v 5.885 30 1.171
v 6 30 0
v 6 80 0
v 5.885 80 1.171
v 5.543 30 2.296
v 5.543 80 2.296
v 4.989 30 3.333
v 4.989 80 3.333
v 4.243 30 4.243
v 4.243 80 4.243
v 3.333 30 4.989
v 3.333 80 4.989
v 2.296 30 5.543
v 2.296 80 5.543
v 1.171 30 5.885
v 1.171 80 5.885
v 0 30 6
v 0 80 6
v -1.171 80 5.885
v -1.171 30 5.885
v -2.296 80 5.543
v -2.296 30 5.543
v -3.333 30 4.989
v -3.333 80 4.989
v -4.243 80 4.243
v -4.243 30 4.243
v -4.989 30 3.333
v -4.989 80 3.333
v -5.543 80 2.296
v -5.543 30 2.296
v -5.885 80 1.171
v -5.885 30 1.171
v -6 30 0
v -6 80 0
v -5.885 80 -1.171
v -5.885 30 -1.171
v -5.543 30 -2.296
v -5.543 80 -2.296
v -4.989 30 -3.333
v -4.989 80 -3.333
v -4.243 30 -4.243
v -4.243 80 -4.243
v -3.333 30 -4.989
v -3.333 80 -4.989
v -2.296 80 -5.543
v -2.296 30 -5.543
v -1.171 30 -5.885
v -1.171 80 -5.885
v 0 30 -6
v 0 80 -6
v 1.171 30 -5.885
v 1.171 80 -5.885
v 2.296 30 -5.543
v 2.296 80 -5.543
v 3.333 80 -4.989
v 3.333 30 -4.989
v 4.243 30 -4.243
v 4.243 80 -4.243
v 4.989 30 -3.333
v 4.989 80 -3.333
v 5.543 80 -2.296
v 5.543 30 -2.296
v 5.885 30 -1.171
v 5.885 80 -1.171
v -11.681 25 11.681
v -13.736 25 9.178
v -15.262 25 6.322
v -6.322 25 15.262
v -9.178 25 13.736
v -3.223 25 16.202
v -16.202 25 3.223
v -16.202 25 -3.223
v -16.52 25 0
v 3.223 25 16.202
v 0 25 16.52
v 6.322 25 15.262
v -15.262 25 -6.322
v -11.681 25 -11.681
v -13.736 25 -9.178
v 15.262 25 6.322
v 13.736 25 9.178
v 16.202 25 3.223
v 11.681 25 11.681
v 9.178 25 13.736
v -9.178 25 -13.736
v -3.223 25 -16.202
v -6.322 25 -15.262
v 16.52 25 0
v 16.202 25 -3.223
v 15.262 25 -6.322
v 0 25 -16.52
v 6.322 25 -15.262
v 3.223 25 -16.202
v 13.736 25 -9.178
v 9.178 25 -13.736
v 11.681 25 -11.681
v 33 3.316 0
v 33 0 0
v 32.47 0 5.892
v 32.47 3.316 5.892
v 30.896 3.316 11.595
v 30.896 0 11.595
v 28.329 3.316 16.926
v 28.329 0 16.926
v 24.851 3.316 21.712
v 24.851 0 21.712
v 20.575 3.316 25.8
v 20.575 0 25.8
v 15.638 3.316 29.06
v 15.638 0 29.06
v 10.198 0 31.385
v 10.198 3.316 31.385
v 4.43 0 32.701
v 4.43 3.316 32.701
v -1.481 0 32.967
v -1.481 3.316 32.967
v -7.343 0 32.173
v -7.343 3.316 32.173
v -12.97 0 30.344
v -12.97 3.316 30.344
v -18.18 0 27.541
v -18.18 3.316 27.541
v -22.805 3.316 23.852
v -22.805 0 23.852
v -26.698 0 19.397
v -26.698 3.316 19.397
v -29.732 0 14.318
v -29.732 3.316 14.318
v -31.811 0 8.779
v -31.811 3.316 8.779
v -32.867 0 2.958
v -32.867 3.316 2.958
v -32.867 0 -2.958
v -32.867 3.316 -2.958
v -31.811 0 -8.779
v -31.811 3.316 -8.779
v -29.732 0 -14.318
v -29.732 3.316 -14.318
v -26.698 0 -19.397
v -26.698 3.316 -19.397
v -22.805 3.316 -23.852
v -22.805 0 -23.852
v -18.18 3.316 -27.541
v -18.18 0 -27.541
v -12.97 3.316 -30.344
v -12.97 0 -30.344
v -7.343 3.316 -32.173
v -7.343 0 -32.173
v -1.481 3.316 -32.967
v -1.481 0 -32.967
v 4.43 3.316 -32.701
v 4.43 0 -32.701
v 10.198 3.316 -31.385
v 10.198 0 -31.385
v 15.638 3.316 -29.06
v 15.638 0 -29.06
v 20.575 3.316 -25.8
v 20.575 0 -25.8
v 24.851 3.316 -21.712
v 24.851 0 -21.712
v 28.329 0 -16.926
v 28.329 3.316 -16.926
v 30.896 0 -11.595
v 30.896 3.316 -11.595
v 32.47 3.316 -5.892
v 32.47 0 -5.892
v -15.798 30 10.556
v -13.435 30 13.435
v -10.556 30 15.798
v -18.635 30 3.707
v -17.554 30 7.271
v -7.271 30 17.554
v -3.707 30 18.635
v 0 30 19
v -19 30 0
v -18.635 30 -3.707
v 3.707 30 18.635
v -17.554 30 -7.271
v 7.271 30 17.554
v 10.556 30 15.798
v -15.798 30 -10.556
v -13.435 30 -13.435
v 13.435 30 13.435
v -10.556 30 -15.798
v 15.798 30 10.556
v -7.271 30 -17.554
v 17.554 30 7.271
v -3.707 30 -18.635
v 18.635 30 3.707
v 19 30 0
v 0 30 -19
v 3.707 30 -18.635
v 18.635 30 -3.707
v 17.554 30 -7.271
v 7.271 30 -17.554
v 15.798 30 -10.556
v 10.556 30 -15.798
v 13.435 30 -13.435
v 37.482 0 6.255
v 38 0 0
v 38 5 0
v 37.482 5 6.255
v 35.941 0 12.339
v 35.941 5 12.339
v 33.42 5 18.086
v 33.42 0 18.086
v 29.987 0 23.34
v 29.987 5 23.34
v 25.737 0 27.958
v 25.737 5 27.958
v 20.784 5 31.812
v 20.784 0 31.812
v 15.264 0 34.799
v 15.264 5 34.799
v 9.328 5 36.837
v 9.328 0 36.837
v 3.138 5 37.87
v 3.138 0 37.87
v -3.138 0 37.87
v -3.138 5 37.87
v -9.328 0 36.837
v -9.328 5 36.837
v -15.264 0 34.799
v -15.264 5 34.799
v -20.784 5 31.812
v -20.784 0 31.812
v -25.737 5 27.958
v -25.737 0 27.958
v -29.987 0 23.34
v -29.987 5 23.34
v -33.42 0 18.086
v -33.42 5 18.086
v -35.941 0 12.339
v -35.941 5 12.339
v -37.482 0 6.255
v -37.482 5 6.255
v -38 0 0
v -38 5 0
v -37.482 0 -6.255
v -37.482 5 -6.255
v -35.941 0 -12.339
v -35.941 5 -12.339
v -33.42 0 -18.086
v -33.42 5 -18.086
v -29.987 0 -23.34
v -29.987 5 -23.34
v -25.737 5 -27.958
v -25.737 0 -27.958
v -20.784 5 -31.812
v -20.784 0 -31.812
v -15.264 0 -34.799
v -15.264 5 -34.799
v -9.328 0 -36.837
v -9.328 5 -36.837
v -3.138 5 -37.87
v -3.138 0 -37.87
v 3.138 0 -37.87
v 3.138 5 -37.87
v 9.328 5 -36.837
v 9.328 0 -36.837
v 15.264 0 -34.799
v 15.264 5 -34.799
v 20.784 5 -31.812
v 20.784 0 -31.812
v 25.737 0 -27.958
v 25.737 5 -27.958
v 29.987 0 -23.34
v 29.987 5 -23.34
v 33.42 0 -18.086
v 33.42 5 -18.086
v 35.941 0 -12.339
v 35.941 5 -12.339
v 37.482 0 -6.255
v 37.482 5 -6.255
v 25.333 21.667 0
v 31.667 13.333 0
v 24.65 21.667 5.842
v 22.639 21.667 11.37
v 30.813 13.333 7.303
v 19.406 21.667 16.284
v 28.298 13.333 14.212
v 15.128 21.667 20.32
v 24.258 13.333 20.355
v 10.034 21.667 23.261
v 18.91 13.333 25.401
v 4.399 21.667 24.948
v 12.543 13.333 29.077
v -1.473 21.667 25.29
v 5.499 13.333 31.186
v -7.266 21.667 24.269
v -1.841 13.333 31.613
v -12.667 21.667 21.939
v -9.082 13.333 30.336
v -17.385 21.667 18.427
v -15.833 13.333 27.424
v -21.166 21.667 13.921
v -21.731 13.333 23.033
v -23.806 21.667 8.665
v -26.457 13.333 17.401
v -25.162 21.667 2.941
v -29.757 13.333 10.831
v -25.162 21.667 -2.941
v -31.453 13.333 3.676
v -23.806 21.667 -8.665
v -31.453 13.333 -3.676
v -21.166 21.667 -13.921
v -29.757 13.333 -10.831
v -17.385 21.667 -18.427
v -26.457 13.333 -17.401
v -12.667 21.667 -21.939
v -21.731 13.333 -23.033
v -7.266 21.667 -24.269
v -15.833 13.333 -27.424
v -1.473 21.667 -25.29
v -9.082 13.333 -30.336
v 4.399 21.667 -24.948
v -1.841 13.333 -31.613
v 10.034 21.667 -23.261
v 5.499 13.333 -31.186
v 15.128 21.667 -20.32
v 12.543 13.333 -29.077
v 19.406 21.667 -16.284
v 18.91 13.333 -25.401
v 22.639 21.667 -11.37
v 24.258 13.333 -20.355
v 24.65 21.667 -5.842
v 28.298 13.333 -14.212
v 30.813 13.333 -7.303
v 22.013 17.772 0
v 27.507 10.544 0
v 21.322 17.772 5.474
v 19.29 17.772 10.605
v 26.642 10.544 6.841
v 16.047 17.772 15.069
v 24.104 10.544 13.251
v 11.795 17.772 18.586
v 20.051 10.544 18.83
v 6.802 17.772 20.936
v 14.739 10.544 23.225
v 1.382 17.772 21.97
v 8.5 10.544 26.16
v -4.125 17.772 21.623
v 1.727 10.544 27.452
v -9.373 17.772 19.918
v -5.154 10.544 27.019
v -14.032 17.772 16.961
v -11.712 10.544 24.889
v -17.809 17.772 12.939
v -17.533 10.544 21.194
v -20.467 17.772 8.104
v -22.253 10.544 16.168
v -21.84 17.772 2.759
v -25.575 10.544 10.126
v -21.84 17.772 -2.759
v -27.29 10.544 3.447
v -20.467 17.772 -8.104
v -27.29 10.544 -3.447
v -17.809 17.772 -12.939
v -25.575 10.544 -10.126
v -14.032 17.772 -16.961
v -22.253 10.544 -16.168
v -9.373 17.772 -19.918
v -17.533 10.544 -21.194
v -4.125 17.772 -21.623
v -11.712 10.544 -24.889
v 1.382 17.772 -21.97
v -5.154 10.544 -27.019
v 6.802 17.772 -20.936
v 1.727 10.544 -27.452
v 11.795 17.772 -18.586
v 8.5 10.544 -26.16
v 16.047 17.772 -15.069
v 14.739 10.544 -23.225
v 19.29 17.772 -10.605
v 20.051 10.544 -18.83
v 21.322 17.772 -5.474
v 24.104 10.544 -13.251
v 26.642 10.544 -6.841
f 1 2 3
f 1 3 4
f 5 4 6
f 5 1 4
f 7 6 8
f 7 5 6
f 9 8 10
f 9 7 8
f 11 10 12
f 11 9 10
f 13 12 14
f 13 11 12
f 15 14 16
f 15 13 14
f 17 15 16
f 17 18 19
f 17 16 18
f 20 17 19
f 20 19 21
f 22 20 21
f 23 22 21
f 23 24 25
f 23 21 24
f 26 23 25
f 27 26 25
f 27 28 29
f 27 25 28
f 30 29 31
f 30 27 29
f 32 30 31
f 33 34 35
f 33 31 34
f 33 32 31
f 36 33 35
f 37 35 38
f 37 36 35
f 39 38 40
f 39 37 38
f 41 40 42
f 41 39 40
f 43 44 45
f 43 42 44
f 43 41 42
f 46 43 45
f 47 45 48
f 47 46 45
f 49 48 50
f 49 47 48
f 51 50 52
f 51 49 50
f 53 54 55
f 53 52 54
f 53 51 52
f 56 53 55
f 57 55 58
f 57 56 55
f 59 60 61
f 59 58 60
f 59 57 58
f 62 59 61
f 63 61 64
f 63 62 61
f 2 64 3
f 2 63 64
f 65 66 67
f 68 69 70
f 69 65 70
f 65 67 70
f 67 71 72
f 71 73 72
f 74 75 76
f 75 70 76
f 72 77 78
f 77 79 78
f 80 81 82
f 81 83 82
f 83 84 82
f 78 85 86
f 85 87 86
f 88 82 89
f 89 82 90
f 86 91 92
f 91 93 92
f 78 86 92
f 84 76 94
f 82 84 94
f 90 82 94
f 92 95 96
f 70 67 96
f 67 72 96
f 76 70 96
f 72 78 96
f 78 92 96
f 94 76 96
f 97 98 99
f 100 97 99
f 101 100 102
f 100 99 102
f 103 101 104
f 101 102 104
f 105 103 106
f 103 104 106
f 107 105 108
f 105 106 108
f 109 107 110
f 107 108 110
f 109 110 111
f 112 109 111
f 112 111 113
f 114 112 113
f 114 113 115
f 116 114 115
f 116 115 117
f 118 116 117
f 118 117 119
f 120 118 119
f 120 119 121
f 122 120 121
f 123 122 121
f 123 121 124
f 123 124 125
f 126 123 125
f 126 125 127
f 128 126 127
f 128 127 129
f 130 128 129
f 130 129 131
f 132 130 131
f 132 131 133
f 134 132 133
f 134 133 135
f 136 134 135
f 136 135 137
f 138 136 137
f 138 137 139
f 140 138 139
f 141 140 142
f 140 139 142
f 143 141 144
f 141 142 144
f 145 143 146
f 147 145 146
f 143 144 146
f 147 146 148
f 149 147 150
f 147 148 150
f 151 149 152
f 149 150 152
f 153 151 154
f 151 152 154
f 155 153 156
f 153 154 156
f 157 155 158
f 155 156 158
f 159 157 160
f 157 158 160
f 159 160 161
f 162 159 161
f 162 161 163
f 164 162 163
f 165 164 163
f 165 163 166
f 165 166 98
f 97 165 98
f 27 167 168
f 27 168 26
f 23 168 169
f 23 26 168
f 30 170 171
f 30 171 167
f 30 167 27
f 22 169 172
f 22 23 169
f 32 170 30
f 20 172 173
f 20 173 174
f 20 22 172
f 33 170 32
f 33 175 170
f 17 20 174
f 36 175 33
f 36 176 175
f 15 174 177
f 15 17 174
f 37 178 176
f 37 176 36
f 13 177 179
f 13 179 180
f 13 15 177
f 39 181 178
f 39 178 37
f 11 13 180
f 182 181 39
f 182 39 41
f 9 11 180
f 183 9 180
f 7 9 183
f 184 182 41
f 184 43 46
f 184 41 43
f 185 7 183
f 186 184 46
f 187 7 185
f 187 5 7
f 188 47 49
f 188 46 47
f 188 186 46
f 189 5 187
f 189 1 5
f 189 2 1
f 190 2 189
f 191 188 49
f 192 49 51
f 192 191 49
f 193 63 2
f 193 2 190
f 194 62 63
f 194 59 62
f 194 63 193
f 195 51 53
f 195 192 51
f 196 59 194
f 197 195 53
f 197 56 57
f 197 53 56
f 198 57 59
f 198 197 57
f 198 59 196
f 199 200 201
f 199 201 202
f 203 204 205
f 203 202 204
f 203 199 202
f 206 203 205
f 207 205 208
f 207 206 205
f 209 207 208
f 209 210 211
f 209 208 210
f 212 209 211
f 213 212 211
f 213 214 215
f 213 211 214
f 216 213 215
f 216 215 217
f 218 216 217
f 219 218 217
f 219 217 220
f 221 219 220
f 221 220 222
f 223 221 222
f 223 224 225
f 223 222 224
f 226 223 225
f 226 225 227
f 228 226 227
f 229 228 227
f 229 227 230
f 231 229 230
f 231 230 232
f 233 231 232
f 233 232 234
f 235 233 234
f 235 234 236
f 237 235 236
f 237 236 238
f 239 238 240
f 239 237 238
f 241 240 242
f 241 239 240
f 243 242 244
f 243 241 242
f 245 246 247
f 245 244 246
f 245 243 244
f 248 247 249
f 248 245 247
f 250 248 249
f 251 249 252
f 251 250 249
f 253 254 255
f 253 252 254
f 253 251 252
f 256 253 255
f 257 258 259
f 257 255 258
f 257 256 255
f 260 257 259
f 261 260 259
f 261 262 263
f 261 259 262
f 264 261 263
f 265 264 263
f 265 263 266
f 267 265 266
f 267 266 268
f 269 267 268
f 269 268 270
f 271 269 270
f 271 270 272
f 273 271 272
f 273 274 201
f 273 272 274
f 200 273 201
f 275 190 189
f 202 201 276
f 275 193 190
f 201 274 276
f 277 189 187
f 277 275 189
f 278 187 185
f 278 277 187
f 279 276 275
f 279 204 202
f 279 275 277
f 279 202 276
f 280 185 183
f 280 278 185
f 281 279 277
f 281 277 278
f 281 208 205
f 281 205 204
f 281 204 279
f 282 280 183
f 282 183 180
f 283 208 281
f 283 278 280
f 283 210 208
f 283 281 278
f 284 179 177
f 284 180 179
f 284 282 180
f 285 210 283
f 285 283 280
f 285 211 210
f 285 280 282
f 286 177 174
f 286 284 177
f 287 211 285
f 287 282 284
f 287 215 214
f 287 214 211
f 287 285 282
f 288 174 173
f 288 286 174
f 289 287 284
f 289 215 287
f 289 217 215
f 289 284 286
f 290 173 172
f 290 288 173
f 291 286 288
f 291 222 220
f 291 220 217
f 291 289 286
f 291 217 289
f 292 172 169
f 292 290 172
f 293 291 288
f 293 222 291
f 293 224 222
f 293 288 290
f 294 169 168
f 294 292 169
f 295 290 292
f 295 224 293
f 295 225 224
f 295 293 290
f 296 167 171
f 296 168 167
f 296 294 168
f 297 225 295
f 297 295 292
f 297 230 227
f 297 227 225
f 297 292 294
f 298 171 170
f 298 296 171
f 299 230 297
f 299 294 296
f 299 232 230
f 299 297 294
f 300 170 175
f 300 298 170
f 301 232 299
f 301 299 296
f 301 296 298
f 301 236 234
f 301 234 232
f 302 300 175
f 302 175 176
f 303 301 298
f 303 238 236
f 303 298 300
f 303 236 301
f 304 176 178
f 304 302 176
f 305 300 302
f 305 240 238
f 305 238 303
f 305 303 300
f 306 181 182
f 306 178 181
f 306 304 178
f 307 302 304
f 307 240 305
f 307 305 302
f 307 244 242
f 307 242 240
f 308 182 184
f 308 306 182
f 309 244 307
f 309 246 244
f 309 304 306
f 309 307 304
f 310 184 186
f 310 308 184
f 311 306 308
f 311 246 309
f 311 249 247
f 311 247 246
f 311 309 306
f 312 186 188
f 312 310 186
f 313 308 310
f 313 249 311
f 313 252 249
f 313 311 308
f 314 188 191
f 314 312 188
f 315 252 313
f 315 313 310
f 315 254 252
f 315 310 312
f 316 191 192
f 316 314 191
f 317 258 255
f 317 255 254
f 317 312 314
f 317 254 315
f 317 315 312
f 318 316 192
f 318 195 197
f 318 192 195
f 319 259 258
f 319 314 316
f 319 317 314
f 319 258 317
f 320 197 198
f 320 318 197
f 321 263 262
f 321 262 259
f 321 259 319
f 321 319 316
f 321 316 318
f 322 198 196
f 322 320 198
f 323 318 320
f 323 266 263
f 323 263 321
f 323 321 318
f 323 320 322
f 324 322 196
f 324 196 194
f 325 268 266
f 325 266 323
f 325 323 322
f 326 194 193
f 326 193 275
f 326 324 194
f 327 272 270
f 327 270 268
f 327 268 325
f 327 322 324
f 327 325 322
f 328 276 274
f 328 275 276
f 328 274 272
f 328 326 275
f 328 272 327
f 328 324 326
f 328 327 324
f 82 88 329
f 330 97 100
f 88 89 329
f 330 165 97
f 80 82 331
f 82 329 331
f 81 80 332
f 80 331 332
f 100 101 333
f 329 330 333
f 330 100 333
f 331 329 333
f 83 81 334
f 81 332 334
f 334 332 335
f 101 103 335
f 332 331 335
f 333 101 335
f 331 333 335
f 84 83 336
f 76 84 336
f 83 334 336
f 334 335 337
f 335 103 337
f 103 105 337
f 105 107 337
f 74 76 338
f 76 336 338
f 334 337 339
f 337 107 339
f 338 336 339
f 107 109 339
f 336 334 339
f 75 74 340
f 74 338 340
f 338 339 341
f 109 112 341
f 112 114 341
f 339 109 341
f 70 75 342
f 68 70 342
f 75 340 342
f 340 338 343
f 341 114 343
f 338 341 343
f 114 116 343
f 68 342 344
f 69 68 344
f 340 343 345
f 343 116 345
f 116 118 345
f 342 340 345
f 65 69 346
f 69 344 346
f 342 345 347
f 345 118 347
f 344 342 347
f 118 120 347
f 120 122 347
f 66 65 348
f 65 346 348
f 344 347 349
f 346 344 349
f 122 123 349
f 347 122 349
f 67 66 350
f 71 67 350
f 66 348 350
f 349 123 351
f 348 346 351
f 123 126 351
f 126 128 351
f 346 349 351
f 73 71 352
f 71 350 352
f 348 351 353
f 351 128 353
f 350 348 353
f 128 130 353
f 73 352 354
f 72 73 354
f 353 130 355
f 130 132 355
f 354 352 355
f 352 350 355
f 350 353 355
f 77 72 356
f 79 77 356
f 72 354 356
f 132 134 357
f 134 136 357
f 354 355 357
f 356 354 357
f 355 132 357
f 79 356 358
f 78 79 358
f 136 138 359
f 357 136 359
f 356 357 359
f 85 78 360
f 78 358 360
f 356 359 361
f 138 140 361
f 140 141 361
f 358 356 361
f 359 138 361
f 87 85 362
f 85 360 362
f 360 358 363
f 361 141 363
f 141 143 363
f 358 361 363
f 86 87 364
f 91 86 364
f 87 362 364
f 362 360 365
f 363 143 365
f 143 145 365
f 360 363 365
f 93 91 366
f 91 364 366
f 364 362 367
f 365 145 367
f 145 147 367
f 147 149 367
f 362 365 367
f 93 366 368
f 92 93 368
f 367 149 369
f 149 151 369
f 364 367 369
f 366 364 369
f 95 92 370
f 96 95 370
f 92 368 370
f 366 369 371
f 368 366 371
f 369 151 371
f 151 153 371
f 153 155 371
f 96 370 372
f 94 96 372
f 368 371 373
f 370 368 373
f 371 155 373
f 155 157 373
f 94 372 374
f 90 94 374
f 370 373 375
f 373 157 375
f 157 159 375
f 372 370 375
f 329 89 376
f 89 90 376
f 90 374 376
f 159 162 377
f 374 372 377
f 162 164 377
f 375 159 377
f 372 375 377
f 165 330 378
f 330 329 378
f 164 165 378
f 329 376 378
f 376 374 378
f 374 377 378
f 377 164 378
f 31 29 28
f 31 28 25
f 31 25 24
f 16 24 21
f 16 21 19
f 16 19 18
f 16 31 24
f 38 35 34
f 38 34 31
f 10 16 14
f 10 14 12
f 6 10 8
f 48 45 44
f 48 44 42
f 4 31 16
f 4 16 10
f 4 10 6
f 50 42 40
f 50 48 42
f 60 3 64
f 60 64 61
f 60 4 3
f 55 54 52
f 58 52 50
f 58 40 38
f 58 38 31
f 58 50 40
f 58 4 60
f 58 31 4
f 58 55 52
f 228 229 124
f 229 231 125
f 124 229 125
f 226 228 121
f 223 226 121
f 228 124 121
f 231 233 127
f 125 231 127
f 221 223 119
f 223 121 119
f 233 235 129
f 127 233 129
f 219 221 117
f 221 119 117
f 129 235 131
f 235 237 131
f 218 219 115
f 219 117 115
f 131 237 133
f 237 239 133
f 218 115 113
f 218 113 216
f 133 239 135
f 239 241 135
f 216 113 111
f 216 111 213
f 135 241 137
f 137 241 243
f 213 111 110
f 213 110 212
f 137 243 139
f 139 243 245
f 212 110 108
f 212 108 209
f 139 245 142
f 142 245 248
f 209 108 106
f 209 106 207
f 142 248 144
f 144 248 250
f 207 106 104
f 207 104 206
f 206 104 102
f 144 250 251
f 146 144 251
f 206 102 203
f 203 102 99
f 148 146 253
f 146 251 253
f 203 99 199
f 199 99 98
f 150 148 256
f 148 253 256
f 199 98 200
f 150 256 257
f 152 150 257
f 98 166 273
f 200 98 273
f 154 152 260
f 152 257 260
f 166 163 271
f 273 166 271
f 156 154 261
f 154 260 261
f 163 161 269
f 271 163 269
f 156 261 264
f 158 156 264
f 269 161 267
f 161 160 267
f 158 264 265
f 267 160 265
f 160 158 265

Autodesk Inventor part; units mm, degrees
ref_plane "YZ Plane" through (0, 0, 0) normal (1, 0, 0) x (0, 1, 0)
ref_plane "XZ Plane" through (0, 0, 0) normal (0, 1, 0) x (-1, 0, 0)
ref_plane "XY Plane" through (0, 0, 0) normal (0, 0, 1) x (1, 0, 0)
sketch "Sketch1" plane through (0, 0, 0) normal (0, 0, 1) x (1, 0, 0)
  line L0 (0, 0) -> (0, 30)
  line L1 (0, 30) -> (19, 30)
  line L2 (19, 30) -> (38, 5)
  line L3 (38, 5) -> (38, 0)
  line L4 (38, 0) -> (0, 0)
  dimension "C" = 76
  dimension "d1" = 30
  dimension "d2" = 5
  dimension "d3" = 38
revolve "Revolution1" add sketch "Sketch1" angle 360 about axis through (0, 0, 0) along (0, 1, 0)
shell "Shell1" thickness 5 removed faces 1 at (9.1519, 0, -15.3991)
sketch "Sketch2" plane through (0, 30, 0) normal (0, 1, 0) x (1, 0, 0)
  circle A0 centre (0, 0) radius 19 projected
  circle A1 centre (0, 0) radius 6
  dimension "d6" = 12
extrude "Extrusion1" add sketch "Sketch2" along normal blind 50 contours A1
thread "Thread1" size "M12x1.75" class "6g" standard "ANSI Metric M Profile" full length
equation "\"d3\" = 0.5 * C"
equation "\"d7\" = Dmax - d1"
equation "\"Dmin\" = 41"
equation "\"Dmax\" = 80"
properties part number "21-013"
